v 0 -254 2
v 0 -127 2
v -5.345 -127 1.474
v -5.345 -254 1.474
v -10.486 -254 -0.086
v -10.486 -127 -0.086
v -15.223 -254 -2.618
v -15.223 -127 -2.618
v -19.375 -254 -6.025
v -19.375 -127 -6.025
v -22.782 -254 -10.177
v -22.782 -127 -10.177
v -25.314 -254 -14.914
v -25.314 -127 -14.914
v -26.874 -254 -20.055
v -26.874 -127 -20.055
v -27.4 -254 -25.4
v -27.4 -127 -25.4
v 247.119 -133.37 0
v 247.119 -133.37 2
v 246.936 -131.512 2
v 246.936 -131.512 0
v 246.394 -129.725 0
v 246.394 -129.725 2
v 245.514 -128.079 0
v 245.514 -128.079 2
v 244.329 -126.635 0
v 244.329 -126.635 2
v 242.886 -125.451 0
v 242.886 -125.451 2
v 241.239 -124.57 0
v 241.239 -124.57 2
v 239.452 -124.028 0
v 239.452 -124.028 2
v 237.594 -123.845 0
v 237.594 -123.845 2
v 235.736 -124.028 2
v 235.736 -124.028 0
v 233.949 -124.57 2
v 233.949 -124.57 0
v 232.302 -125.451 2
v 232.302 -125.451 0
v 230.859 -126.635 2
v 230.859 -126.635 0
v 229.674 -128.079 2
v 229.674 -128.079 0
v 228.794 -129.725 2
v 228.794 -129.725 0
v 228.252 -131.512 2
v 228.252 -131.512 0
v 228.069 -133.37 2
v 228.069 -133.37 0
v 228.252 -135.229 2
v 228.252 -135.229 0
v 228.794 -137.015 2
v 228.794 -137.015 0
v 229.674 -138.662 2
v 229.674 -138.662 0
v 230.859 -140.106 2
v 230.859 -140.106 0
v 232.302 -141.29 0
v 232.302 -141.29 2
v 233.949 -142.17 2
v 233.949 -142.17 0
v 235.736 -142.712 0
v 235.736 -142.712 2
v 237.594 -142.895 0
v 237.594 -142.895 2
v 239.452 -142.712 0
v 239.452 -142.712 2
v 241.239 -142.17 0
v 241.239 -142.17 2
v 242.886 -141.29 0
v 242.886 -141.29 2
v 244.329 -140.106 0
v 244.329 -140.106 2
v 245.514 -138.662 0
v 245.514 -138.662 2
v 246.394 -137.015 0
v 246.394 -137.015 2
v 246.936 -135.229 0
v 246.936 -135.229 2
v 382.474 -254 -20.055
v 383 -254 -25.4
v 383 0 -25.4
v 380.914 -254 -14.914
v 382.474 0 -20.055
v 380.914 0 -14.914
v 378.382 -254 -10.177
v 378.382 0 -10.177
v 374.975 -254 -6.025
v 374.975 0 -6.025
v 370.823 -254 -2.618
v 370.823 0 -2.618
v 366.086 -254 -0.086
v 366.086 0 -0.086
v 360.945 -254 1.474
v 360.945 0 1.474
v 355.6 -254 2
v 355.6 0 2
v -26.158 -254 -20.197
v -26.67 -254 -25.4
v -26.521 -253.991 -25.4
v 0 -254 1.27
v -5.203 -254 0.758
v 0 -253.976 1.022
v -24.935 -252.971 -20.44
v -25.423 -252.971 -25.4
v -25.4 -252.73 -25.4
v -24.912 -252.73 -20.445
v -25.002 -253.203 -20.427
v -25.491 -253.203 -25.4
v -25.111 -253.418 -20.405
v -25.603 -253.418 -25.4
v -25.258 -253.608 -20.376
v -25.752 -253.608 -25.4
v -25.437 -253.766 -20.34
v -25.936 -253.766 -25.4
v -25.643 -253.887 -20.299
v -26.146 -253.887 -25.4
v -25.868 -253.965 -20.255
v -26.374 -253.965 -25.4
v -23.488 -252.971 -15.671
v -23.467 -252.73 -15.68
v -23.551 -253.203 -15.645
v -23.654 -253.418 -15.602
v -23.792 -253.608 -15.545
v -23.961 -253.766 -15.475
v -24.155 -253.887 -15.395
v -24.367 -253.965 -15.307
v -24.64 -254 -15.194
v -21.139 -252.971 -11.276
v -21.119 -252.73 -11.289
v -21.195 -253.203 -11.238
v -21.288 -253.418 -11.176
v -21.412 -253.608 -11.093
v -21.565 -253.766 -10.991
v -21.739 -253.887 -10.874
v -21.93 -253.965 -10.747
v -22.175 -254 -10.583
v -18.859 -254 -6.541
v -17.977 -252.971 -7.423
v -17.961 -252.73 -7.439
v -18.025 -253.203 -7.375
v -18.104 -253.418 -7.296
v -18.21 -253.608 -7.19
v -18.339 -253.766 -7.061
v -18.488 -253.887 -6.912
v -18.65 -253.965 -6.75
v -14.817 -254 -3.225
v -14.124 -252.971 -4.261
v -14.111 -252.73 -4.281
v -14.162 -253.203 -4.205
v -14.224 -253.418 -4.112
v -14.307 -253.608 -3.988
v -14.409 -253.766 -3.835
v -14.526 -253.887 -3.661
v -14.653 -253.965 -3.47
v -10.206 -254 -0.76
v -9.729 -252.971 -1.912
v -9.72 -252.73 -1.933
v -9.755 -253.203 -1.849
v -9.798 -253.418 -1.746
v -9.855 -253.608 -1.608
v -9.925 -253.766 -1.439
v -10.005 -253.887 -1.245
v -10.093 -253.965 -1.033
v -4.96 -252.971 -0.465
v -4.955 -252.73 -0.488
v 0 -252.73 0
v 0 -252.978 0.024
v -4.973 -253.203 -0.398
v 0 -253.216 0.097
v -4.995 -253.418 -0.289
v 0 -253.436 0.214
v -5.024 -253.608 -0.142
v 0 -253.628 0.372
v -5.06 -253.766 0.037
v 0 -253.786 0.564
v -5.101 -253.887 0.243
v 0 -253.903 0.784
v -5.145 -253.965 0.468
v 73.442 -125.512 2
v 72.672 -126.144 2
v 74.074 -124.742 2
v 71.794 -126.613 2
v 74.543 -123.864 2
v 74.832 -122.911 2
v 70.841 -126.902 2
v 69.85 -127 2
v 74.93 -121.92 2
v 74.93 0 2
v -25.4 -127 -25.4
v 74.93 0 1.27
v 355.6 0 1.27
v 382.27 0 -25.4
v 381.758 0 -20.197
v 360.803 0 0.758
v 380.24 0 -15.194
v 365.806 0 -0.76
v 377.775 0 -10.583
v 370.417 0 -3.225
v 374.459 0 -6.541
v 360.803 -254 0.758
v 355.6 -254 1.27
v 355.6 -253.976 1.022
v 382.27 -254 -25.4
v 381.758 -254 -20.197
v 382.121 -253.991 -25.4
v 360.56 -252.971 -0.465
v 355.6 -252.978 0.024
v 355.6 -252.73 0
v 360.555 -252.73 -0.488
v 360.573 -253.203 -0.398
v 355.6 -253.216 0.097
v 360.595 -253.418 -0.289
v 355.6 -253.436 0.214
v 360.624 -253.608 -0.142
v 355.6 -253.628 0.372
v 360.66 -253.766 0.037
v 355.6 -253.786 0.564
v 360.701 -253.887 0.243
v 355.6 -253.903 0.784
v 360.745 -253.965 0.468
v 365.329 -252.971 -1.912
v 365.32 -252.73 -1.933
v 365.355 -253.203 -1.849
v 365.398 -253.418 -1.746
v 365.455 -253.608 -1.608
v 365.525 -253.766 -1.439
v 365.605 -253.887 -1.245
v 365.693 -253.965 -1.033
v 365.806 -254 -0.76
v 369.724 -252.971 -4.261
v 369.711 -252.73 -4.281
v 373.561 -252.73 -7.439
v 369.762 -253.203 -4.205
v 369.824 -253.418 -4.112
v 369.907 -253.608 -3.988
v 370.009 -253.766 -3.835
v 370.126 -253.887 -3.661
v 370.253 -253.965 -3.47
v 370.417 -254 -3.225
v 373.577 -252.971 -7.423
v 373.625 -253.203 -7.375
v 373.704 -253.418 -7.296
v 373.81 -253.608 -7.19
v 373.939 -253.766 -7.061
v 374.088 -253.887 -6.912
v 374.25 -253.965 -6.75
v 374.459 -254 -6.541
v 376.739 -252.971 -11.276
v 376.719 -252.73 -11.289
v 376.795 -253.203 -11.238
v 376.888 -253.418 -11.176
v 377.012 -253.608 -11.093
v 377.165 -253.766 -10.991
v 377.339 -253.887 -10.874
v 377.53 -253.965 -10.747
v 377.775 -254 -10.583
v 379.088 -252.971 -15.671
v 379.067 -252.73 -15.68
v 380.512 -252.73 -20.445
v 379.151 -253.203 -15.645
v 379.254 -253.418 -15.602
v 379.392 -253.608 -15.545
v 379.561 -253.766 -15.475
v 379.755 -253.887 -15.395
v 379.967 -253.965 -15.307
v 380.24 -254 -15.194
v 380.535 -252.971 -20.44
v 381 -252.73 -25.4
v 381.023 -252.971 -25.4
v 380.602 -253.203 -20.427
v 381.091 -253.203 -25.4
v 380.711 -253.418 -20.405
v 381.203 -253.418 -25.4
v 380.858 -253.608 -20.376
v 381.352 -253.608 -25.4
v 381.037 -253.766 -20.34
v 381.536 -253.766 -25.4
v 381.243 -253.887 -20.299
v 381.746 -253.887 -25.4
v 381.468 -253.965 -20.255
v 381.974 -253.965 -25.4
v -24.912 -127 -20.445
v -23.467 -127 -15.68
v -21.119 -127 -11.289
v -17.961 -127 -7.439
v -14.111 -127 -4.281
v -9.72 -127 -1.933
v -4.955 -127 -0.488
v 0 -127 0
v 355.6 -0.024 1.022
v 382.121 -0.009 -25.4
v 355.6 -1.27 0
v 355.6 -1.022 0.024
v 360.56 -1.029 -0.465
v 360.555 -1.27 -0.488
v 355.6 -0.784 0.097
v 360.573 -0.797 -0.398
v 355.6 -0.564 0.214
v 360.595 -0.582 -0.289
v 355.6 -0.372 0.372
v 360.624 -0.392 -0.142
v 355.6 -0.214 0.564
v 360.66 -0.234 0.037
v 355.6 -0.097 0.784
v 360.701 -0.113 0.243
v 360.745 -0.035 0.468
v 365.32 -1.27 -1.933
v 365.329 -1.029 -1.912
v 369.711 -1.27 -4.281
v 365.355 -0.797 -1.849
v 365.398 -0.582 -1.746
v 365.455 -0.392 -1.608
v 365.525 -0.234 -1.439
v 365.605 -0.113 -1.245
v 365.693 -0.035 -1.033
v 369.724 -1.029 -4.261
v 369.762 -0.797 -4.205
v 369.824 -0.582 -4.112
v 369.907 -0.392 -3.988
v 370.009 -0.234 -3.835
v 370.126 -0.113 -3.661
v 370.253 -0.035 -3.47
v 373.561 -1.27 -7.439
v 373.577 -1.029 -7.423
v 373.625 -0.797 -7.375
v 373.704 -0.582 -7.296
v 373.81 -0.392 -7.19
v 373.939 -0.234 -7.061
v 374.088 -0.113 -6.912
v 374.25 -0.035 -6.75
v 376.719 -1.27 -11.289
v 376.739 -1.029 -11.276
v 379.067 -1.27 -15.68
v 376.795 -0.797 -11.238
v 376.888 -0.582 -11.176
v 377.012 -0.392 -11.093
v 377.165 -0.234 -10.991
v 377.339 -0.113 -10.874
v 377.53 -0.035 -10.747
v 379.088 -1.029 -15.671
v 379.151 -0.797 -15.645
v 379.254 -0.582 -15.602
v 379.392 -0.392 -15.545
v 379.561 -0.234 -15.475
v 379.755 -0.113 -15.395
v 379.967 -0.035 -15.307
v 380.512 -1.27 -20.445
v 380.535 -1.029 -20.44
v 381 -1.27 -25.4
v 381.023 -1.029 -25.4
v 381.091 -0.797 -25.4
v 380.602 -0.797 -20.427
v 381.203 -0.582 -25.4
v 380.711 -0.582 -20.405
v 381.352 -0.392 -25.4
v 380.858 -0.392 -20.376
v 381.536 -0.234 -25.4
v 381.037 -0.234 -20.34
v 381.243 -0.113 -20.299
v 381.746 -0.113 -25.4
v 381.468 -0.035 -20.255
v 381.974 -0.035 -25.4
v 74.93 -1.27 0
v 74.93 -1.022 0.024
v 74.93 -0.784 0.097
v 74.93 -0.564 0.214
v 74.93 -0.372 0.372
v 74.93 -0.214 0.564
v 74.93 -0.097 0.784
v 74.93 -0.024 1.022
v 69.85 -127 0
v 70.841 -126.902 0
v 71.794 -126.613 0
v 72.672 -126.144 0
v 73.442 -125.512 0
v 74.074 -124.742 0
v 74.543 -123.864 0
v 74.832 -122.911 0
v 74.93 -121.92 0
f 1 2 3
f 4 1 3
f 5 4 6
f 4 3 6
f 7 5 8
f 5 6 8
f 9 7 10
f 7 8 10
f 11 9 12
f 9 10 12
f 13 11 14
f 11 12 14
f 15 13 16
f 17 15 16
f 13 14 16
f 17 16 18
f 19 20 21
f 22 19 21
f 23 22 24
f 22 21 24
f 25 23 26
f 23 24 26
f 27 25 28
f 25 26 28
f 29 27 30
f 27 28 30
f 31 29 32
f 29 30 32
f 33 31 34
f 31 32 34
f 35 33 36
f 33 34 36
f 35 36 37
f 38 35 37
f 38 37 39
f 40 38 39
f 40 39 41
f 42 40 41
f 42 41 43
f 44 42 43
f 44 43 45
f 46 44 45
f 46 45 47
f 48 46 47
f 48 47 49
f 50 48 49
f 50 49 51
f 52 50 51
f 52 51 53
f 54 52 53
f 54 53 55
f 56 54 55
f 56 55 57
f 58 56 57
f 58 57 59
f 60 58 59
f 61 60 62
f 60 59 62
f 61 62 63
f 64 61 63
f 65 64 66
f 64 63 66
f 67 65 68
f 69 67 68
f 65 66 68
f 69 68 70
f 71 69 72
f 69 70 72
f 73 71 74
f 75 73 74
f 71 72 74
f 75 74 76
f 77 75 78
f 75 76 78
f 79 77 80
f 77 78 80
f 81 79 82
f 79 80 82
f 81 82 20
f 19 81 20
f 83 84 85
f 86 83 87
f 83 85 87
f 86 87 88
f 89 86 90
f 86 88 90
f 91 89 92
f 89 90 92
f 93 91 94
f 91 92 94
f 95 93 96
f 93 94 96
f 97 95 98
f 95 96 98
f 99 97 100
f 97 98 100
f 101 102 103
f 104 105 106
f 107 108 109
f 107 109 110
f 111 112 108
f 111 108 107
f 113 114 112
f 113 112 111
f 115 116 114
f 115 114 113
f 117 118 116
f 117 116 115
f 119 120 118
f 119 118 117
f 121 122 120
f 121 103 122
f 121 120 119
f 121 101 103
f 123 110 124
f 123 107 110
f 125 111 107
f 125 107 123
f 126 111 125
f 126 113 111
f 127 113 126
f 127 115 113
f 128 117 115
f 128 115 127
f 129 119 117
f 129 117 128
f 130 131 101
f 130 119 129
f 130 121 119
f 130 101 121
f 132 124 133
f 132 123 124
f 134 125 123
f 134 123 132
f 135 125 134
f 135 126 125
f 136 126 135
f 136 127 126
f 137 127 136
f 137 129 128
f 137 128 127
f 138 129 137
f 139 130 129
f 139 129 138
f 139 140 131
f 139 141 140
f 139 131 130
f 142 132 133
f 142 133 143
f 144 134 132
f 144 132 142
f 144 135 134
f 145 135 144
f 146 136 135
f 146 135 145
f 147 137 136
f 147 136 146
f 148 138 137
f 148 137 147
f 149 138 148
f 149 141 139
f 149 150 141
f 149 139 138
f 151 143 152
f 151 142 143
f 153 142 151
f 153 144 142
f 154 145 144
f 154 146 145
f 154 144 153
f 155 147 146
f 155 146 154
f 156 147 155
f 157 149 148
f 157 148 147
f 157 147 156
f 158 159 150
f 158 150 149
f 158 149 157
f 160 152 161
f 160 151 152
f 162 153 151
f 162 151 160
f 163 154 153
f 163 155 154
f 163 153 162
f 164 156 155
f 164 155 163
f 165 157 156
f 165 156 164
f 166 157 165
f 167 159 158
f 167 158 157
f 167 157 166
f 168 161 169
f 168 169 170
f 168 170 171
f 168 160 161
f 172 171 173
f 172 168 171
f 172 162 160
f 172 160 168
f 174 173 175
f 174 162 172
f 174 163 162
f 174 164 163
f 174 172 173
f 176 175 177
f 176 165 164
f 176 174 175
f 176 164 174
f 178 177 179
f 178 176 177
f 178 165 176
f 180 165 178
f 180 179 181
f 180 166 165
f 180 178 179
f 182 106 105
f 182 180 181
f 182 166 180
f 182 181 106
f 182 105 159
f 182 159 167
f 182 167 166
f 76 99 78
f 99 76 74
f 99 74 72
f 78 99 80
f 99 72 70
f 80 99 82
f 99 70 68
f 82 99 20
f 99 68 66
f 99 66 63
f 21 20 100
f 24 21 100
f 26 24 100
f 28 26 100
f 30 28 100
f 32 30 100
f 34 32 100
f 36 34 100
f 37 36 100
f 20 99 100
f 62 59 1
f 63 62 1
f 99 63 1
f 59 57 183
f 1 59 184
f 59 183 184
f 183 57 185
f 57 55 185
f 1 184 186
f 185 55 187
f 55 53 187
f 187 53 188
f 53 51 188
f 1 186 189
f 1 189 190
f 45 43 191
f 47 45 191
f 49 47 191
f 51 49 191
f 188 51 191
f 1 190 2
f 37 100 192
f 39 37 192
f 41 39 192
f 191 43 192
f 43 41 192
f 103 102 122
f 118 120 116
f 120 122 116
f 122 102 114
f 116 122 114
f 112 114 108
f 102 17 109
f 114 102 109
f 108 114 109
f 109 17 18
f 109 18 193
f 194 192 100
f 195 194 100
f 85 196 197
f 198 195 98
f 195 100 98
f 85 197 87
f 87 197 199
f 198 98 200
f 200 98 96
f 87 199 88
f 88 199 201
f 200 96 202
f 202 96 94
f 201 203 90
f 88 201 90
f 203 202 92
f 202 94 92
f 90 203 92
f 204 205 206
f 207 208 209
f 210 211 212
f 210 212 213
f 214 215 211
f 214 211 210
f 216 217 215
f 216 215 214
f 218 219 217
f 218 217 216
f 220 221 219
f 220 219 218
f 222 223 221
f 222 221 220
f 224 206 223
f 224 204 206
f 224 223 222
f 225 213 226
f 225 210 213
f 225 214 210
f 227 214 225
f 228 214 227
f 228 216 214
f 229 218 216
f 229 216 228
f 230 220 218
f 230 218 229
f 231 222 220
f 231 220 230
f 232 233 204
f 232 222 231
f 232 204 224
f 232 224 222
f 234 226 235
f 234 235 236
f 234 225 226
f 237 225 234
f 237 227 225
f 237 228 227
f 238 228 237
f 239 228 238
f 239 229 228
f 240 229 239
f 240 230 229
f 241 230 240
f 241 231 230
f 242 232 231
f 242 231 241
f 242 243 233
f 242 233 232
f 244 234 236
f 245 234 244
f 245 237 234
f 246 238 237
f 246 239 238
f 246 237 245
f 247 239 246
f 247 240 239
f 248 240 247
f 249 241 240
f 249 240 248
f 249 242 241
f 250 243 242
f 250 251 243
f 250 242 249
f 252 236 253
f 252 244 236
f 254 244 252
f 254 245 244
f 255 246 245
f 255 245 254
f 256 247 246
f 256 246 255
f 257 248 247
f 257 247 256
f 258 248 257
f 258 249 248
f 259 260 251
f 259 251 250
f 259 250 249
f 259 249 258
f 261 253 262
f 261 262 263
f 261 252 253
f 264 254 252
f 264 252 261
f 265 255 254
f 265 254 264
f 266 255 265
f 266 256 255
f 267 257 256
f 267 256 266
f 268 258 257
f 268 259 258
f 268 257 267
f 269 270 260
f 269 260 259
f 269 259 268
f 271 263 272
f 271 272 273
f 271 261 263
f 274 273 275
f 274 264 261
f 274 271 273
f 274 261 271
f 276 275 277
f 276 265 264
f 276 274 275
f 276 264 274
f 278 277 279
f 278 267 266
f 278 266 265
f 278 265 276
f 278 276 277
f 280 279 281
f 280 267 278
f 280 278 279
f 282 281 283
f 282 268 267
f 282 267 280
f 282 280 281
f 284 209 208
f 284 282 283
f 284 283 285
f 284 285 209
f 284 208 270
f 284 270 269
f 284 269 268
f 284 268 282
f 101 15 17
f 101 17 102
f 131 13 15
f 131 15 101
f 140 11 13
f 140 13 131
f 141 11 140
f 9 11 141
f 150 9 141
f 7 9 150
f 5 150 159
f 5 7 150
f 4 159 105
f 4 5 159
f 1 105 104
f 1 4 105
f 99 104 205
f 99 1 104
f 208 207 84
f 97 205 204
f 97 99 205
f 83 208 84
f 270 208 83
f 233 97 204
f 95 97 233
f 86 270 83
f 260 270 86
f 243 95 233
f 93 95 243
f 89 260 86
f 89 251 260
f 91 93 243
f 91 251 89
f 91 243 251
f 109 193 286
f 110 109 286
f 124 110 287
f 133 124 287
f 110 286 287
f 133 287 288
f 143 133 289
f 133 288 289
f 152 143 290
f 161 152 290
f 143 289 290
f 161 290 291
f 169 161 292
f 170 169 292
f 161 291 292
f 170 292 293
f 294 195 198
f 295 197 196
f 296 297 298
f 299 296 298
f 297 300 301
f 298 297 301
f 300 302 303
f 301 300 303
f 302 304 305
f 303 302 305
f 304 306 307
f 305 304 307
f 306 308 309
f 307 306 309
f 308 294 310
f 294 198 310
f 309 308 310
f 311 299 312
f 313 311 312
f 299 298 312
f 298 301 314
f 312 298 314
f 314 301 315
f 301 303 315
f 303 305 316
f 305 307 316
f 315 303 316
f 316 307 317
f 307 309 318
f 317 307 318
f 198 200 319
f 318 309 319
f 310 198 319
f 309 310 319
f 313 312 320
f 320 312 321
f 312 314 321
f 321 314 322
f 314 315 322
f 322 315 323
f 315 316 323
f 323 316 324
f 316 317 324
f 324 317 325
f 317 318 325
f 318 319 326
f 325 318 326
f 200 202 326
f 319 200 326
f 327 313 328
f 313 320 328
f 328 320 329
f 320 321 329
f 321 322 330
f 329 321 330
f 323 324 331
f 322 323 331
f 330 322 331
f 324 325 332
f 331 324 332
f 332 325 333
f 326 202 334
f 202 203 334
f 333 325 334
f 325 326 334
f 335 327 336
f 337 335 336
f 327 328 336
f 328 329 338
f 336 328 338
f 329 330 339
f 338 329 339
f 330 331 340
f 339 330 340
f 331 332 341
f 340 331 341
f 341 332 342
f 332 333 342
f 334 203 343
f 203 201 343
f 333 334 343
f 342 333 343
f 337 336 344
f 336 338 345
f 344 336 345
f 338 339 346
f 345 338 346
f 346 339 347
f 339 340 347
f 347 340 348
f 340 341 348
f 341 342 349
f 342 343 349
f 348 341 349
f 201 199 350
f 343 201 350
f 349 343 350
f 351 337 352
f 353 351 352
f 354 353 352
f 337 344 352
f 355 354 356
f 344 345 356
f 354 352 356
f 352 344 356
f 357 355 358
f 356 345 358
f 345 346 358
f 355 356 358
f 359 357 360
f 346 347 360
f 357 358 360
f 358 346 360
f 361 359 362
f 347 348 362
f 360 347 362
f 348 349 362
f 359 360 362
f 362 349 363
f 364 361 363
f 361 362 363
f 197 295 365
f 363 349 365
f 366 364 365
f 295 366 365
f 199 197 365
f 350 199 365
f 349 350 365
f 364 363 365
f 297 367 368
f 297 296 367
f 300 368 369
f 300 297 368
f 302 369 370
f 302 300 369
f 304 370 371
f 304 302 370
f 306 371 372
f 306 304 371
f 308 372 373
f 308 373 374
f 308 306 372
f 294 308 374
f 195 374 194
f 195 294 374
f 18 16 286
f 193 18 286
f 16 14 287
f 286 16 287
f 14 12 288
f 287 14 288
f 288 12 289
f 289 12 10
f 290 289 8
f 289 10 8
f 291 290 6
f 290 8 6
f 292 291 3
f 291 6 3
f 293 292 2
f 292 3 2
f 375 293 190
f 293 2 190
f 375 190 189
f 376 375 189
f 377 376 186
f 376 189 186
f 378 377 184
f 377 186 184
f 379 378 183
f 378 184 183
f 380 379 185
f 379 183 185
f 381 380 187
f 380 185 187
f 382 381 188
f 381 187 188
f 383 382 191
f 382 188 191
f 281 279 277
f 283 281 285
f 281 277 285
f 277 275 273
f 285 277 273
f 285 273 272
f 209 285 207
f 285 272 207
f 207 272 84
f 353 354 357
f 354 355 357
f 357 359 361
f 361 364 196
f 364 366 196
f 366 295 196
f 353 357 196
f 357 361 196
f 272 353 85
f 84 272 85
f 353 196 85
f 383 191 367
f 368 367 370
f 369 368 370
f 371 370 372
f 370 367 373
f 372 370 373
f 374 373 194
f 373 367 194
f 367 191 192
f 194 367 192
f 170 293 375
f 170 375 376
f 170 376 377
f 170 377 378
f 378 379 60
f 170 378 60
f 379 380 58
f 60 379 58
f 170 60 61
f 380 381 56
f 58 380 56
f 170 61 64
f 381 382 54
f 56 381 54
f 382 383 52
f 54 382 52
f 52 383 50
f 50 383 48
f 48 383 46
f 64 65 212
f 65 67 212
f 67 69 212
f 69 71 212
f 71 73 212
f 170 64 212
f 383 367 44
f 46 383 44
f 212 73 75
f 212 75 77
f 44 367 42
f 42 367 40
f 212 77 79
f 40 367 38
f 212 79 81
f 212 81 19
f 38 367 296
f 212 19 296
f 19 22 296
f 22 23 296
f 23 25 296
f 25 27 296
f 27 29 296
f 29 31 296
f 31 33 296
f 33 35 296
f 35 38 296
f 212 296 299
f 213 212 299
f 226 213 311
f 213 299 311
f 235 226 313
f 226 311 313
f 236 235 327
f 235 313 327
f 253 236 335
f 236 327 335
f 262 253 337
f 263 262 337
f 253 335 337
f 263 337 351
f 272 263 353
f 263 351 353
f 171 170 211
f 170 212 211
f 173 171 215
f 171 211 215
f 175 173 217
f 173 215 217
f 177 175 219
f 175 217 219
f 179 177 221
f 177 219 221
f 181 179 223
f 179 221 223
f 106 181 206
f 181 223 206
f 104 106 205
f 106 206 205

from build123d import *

# Parameters (mm, degrees)
F1_DEPTH = 254
F3_DEPTH = 27.401
F4_W     = 101.6
F4_H     = 38.1
F5_DEPTH = 42.418
F6_R     = 1.27
F7_R     = 9.525
F8_DEPTH = 27.401


with BuildPart() as f1:
    # F0 (on Front) → F1 (new body)
    with BuildSketch(Plane.XZ):
        with BuildLine():
            ThreePointArc((-25.4, -25.4), (-17.960512, -7.439488), (0, 0))
            Line((0, 0), (355.6, 0))
            ThreePointArc((355.6, 0), (373.560512, -7.439488), (381, -25.4))
            Line((381, -25.4), (383, -25.4))
            ThreePointArc((383, -25.4), (374.974726, -6.025274), (355.6, 2))
            Line((355.6, 2), (0, 2))
            ThreePointArc((0, 2), (-19.374726, -6.025274), (-27.4, -25.4))
            Line((-27.4, -25.4), (-25.4, -25.4))
        make_face()
    extrude(amount=F1_DEPTH)

    # F2 (on face) → F3 (cut, through all)
    with BuildSketch(Plane.XY.offset(2)):
        with BuildLine():
            Line((74.93, 0), (50.8, 0))
            Line((50.8, 0), (-52.07, 0))
            Line((-52.07, 0), (-52.07, -101.6))
            Line((-52.07, -101.6), (-52.07, -127))
            Line((-52.07, -127), (0, -127))
            Line((0, -127), (69.85, -127))
            ThreePointArc((69.85, -127), (73.442102, -125.512102), (74.93, -121.92))
            Line((74.93, -121.92), (74.93, -25.4))
            Line((74.93, -25.4), (74.93, 0))
        make_face()
    extrude(amount=-F3_DEPTH, mode=Mode.SUBTRACT)

    # F4 (on Right) → F5 (cut)
    with BuildSketch(Plane.YZ):
        with Locations((-50.8, -19.05)):
            Rectangle(F4_W, F4_H)
    extrude(amount=-F5_DEPTH, mode=Mode.SUBTRACT)

    # F6
    f6_edges = [f1.edges().sort_by_distance(p)[0] for p in [
        (177.8, -254, 0),
        (215.265, 0, 0),
    ]]
    fillet(f6_edges, radius=F6_R)

    # F7 (on face) → F8 (cut, through all)
    with BuildSketch(Plane.XY.offset(2)):
        with Locations((237.59414, -133.37032)):
            Circle(F7_R)
    extrude(amount=-F8_DEPTH, mode=Mode.SUBTRACT)


solid = f1.part
